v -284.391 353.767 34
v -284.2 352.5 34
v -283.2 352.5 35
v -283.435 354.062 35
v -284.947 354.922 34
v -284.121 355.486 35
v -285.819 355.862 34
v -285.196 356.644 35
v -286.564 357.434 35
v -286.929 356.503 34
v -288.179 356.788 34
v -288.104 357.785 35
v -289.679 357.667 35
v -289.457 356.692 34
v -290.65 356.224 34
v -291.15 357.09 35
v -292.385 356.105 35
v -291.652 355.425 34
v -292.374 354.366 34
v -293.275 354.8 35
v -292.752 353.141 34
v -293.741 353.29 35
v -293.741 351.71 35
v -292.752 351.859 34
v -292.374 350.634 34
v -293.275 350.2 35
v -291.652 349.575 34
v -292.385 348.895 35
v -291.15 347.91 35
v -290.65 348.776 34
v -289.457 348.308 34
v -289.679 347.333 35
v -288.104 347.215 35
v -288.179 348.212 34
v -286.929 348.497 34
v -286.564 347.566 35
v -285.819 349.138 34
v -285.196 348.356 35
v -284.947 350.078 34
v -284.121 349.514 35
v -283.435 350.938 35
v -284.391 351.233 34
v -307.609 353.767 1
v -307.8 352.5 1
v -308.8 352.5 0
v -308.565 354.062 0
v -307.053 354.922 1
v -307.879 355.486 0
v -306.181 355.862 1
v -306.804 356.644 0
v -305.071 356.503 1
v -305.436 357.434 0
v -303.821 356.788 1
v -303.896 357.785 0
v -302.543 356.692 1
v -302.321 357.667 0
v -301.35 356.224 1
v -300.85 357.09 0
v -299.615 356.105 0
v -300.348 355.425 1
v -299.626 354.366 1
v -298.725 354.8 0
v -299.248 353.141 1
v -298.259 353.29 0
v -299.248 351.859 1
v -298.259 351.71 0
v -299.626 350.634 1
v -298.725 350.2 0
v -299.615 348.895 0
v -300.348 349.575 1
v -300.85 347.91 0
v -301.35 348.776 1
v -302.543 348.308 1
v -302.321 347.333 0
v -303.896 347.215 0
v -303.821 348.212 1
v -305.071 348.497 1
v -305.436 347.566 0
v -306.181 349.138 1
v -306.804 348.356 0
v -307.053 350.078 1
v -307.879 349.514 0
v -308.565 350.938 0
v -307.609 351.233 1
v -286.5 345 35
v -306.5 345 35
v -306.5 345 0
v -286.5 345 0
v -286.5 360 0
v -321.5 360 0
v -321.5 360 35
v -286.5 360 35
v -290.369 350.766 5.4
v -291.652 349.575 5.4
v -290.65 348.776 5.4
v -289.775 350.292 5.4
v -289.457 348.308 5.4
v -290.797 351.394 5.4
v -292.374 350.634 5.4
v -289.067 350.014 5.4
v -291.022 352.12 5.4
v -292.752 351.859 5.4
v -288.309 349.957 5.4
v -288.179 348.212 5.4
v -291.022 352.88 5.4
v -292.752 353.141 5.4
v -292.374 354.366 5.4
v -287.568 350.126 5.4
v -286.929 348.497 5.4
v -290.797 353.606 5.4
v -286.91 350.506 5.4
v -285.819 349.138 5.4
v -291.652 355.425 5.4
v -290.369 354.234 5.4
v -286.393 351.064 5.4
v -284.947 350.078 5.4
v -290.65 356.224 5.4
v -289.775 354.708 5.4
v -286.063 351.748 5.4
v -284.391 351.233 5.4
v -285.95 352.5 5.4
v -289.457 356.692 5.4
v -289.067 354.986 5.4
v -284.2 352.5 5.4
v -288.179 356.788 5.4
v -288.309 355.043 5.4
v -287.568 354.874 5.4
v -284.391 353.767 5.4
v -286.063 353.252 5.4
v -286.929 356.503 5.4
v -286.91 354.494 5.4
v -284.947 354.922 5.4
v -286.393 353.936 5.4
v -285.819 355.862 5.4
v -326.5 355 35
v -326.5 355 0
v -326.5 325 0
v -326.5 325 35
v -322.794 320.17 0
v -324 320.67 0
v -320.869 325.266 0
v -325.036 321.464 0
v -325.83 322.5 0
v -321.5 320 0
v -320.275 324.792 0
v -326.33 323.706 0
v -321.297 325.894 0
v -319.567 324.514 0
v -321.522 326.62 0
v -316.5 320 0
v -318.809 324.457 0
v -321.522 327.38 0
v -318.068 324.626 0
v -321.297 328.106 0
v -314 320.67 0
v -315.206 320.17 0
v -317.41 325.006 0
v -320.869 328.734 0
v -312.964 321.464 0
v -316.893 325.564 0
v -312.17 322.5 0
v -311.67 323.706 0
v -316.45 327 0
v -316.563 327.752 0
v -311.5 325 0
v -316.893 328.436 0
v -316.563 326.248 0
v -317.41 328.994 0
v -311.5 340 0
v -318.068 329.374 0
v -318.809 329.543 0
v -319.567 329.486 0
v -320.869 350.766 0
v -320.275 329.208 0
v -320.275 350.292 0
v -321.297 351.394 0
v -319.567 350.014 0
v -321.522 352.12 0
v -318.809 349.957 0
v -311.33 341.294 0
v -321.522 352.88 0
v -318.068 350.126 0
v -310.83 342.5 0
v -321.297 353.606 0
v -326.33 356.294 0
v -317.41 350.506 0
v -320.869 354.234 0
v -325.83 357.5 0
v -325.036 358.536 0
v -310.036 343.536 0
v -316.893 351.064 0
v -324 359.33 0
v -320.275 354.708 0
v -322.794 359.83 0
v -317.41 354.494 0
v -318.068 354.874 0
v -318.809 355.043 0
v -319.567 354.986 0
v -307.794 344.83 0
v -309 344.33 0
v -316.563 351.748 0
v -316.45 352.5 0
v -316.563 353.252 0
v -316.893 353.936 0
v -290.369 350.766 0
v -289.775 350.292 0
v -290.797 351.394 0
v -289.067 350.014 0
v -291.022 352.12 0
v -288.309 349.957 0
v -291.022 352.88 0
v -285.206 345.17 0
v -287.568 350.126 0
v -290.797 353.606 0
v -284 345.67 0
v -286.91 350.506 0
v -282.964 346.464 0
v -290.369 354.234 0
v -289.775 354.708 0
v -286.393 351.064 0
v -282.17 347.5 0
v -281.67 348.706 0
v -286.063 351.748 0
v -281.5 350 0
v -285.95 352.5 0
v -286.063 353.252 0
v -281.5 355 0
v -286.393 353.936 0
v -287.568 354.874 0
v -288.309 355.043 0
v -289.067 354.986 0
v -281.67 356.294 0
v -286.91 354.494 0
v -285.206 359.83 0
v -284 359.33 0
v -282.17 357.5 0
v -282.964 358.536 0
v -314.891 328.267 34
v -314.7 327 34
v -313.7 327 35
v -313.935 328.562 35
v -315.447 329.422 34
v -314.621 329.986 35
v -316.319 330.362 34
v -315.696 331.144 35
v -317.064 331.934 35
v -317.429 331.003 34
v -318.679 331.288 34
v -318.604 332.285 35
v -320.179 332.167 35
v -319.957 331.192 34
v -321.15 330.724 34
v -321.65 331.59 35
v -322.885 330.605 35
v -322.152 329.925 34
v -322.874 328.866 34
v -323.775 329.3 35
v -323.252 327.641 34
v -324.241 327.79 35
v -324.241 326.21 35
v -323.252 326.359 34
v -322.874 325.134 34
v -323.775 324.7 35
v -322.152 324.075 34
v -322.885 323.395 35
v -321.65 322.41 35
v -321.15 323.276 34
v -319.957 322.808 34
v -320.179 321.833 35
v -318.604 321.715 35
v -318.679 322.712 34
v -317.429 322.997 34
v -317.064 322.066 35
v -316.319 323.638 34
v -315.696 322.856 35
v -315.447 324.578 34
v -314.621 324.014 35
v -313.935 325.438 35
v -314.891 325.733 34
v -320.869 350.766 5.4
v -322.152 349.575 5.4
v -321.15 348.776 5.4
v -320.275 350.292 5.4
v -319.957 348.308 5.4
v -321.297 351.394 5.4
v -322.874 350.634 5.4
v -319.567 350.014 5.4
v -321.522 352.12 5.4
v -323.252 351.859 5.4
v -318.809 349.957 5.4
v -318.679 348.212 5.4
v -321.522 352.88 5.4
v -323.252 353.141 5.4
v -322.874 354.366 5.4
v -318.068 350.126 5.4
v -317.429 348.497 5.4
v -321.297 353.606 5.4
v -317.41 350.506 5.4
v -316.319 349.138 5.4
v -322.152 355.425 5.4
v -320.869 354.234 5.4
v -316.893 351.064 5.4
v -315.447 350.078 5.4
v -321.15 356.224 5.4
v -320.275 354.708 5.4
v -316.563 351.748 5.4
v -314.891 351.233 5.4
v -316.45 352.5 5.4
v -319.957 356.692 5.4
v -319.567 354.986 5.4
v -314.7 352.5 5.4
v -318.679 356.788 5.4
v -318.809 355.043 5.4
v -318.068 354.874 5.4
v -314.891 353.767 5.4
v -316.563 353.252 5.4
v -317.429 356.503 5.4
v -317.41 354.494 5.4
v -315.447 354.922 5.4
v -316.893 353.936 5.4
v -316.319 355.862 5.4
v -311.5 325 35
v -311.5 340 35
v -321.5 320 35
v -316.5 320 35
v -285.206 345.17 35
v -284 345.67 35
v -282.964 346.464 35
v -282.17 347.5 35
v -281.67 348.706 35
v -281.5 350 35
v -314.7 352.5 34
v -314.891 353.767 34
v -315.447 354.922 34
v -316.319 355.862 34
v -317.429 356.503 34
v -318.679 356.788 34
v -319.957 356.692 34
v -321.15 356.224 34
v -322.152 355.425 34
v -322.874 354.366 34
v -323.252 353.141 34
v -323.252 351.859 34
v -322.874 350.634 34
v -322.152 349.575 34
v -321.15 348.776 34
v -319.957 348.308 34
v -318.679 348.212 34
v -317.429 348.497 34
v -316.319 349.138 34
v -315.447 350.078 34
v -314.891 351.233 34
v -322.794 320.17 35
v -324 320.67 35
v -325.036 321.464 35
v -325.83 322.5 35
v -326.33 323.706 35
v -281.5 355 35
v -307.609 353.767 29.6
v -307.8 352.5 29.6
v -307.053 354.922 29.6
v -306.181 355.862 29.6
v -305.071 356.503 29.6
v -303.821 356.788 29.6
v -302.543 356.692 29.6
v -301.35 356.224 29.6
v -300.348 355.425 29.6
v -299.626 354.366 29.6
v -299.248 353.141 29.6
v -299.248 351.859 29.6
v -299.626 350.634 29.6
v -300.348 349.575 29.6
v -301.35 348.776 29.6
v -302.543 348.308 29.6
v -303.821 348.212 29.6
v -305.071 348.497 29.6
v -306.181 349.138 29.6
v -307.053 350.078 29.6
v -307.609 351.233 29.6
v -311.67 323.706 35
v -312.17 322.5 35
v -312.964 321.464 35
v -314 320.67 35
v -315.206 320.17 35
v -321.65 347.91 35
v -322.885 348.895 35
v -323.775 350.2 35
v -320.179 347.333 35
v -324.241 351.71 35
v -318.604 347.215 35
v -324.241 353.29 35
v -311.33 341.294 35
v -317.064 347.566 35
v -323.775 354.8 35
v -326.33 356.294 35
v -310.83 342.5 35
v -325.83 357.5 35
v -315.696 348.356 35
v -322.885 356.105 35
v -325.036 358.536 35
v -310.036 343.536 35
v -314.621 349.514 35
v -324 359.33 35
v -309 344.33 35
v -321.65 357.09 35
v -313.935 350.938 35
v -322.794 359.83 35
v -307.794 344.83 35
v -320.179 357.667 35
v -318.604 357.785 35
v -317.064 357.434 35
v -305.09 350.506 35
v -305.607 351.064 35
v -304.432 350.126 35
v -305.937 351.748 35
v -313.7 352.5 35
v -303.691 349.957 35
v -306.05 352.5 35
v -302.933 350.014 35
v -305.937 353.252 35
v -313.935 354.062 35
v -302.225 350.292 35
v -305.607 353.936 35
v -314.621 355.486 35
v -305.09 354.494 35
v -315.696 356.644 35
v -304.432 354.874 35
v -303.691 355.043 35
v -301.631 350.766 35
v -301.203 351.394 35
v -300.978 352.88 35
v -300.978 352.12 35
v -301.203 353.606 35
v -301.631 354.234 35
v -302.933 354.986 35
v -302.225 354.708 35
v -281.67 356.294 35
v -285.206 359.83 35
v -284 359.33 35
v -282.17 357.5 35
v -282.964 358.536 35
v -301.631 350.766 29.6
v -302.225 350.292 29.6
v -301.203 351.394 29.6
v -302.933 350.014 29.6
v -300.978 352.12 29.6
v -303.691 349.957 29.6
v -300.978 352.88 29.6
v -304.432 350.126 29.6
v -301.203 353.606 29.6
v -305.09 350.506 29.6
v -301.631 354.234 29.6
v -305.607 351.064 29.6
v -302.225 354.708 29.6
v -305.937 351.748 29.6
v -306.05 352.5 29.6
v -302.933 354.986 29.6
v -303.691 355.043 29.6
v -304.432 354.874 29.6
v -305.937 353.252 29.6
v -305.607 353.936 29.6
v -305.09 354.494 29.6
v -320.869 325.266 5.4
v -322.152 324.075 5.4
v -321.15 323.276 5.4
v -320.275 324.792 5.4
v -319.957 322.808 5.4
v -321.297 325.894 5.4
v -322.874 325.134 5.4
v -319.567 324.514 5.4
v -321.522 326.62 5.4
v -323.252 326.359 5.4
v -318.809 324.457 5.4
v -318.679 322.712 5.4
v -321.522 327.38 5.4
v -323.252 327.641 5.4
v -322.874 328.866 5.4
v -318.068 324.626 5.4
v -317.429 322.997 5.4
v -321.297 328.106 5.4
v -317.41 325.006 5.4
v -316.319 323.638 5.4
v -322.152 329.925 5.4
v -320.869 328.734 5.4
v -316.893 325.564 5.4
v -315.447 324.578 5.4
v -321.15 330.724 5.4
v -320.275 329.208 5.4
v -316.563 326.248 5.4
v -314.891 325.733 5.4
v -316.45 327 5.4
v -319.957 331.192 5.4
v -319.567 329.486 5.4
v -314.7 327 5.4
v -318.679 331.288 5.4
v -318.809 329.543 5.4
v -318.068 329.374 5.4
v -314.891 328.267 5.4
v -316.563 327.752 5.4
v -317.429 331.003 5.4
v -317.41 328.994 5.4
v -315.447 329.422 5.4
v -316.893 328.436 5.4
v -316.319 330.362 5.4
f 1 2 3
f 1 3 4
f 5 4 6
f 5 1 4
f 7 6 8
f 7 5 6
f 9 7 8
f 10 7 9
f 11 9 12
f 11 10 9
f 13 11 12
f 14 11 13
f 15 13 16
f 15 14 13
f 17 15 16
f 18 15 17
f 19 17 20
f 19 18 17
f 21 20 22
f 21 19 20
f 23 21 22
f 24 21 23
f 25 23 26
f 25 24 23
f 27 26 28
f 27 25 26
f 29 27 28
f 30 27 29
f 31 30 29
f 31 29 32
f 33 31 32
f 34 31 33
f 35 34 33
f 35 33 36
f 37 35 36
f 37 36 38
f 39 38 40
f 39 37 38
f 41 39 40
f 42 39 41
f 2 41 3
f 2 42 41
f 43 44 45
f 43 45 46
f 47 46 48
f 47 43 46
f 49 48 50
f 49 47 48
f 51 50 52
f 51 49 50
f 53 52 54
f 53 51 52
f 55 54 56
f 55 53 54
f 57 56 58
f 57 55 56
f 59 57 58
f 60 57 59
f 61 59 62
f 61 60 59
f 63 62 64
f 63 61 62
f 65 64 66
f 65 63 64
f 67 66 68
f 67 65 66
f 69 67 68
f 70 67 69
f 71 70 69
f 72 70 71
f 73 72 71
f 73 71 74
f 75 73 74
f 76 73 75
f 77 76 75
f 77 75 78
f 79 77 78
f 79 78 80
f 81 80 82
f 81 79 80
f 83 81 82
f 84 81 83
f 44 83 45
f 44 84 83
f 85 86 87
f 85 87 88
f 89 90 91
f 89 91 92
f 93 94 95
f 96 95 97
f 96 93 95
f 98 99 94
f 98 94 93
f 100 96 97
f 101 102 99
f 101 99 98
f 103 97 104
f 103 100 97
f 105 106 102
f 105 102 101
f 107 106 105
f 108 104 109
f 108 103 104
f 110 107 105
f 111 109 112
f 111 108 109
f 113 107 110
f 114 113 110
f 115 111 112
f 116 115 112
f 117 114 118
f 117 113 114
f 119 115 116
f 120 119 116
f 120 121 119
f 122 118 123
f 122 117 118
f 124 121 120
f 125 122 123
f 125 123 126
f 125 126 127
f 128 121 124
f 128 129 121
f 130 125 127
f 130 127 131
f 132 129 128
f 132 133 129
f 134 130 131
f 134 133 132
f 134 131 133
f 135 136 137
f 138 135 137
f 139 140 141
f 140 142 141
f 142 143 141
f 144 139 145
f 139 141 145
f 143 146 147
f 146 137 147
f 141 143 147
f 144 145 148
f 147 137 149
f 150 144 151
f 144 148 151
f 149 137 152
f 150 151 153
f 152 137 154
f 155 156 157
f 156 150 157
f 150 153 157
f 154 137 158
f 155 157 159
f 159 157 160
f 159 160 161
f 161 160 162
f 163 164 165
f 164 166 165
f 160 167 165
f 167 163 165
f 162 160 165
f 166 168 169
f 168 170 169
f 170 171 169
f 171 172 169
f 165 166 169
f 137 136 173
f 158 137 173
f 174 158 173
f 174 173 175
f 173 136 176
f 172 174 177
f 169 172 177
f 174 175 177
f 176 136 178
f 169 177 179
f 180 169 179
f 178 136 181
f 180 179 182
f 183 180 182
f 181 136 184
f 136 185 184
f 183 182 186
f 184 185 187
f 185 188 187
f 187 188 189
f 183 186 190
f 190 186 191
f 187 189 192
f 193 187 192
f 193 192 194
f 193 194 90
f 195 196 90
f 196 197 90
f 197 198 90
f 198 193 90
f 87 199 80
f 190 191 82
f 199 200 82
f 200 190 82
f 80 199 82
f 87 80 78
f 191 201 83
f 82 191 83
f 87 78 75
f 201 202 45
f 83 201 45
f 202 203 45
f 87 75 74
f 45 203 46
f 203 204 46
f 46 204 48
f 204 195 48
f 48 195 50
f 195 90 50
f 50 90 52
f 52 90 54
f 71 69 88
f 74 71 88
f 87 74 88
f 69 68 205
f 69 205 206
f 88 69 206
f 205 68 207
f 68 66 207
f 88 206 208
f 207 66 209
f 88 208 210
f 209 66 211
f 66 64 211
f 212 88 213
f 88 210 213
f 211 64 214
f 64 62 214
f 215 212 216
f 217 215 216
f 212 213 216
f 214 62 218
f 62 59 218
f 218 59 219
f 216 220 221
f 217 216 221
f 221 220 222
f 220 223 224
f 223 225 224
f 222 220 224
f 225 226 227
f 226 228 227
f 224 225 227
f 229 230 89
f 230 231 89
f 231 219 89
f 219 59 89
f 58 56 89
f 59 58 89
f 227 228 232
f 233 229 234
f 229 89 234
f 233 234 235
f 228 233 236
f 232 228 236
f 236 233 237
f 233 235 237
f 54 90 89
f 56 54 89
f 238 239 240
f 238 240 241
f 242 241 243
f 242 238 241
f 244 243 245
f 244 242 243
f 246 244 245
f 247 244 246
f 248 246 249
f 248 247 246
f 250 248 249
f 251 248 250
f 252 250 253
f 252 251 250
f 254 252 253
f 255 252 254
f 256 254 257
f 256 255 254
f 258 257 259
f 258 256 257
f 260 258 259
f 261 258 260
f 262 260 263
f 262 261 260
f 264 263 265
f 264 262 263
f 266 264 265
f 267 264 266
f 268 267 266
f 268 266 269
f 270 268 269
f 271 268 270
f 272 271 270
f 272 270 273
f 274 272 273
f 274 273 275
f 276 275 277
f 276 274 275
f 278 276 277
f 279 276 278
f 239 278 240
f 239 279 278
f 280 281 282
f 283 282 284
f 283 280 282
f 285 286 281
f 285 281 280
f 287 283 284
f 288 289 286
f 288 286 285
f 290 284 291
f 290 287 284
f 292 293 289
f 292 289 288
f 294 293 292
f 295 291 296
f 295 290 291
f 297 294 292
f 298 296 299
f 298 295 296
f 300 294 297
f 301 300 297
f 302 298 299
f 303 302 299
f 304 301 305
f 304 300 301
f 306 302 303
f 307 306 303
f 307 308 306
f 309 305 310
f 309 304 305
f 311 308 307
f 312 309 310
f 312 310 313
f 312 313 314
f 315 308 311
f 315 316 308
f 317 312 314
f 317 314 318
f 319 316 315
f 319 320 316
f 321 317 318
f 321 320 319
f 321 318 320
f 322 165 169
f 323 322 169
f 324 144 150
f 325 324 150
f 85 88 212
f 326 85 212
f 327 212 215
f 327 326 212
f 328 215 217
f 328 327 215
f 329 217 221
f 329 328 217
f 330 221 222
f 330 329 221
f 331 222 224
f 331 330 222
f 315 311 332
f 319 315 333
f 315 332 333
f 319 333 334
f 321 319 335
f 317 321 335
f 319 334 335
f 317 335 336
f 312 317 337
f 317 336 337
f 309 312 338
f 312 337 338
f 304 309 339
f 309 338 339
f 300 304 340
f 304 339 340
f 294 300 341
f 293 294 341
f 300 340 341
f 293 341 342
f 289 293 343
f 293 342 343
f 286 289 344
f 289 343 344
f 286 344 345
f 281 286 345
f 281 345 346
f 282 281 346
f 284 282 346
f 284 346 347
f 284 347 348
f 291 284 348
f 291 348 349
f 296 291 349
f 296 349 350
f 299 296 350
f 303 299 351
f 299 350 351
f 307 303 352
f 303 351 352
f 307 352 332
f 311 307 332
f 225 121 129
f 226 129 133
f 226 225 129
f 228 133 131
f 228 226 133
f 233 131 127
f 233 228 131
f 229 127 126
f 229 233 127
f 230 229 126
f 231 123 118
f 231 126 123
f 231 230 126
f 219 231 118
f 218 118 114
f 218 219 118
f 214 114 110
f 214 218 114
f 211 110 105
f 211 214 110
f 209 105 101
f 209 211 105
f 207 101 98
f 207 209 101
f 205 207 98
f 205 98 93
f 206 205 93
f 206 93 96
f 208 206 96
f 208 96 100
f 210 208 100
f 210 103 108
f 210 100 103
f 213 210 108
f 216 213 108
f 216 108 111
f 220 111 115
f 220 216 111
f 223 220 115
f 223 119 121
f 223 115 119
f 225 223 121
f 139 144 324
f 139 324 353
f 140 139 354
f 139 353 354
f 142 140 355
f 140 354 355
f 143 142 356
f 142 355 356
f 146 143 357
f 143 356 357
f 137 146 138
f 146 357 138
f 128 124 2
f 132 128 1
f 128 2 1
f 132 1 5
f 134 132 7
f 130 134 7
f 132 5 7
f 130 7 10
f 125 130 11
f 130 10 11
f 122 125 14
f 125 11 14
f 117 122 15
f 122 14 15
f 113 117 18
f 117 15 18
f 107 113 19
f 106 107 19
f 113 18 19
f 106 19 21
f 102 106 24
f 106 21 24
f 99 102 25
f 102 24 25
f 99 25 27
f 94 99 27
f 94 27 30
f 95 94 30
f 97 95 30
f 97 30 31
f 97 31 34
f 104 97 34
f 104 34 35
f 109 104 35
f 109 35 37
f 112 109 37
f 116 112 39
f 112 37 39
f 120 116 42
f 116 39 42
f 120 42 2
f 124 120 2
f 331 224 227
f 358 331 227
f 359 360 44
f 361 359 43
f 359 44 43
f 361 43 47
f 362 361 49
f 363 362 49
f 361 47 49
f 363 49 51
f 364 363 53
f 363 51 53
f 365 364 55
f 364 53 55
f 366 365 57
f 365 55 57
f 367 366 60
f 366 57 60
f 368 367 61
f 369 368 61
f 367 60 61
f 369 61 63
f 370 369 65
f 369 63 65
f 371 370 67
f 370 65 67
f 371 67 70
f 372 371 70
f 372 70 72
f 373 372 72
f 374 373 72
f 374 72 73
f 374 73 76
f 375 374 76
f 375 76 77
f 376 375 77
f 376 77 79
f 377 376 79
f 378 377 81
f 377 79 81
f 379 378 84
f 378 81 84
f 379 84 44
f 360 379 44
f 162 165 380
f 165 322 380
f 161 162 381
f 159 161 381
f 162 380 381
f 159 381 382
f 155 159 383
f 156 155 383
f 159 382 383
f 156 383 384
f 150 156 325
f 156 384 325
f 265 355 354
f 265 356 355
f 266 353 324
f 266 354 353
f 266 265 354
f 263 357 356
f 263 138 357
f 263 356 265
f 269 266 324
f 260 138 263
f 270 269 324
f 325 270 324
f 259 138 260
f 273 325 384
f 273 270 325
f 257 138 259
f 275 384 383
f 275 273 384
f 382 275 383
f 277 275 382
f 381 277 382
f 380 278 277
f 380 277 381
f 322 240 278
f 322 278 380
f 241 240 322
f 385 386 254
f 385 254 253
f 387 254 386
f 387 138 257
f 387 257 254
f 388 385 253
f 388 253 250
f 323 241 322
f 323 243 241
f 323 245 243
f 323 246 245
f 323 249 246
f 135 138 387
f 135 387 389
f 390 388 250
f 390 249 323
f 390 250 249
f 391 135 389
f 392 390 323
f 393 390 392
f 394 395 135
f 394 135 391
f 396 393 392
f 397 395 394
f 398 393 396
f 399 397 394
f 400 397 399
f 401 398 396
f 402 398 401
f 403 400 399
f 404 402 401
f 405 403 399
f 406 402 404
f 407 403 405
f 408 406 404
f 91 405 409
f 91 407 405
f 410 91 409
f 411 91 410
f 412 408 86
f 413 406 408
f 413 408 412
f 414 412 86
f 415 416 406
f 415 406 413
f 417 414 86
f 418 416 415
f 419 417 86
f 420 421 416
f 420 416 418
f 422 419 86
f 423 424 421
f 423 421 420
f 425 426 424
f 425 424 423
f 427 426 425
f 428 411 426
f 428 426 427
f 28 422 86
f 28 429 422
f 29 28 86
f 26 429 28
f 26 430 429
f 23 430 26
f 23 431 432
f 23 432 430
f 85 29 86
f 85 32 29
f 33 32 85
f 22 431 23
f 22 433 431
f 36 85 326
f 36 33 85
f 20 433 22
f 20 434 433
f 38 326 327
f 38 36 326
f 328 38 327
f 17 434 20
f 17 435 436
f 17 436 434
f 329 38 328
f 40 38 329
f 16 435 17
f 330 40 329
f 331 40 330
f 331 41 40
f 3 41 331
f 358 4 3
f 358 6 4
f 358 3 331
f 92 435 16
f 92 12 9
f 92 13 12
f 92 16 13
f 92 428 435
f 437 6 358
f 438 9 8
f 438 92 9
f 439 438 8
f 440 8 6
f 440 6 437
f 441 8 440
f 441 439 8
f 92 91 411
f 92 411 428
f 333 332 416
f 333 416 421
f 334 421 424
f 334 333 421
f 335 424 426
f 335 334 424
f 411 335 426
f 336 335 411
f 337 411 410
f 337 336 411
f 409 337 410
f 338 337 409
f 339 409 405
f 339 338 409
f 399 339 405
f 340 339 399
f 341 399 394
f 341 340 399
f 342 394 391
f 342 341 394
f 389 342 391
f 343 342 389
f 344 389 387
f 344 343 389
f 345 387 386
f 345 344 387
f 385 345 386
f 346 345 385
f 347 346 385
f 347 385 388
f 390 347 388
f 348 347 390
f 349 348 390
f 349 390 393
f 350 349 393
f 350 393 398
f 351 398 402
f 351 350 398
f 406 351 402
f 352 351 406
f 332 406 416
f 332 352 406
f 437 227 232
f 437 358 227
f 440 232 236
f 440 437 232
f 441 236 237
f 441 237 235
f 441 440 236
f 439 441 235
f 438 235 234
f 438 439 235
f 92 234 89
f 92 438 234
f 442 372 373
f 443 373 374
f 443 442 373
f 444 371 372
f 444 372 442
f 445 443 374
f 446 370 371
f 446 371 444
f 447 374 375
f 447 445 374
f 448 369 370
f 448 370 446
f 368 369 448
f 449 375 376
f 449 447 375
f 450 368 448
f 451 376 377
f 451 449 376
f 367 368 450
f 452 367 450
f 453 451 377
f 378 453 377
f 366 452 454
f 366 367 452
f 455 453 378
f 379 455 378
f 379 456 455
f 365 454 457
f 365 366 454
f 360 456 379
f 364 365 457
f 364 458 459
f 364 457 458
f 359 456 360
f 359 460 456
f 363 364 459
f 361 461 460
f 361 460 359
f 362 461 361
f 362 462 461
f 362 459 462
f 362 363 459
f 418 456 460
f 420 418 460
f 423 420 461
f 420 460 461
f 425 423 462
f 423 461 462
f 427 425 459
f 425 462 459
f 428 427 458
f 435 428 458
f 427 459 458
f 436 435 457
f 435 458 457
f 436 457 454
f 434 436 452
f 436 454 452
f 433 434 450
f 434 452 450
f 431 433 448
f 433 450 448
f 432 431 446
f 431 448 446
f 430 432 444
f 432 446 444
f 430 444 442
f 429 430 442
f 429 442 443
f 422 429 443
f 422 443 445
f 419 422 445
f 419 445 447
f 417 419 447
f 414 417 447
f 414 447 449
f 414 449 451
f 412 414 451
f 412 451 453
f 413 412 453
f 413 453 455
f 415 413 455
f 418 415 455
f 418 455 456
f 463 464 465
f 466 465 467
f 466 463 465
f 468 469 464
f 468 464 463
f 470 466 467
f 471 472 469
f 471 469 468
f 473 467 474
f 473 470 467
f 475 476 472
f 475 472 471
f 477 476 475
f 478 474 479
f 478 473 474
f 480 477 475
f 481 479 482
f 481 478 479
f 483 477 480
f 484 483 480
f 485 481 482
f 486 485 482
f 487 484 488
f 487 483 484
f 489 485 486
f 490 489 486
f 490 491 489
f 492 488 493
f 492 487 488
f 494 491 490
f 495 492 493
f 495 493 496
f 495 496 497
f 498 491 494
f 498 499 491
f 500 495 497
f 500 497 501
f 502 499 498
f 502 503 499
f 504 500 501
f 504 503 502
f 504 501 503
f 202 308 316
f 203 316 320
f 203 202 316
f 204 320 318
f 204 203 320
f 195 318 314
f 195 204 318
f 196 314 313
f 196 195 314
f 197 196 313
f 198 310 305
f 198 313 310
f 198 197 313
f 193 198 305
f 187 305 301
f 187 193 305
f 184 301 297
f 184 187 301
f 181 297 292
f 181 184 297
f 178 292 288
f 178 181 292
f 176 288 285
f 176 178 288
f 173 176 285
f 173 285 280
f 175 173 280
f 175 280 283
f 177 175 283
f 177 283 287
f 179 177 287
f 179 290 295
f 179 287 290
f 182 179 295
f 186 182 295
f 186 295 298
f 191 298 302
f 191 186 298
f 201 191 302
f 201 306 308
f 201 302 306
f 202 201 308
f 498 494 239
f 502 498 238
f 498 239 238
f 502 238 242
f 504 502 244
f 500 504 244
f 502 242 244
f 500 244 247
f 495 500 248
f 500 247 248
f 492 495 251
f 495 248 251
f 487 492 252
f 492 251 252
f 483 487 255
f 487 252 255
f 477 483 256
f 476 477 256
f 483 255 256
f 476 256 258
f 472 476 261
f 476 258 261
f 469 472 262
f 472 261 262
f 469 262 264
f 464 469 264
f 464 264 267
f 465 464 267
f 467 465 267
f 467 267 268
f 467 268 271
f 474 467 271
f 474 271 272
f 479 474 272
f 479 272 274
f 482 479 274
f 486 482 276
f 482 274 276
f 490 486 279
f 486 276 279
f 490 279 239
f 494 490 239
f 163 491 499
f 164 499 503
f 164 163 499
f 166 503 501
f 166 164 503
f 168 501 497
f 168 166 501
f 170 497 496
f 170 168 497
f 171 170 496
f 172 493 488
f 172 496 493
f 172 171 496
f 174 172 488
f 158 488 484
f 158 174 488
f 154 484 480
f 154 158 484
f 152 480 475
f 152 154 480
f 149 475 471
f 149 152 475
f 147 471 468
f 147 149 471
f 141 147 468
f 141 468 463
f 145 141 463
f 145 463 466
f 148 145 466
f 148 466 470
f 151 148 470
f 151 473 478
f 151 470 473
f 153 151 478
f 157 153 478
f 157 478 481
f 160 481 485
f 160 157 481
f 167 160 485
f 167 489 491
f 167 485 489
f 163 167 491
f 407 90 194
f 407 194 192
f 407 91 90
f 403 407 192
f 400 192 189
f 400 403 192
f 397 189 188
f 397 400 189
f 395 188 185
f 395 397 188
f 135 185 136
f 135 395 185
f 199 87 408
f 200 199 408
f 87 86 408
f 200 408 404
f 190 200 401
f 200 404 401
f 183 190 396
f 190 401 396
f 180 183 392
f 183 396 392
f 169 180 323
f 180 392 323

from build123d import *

# Parameters (mm, degrees)
SKETCH2_R           = 2.55
SKETCH2_W           = 30
SKETCH2_H           = 15
BOSS_EXTRUDE1_DEPTH = 35
SKETCH3_R           = 4.3
CUT_EXTRUDE1_DEPTH  = 29.6
SKETCH4_R           = 4.3
CUT_EXTRUDE2_DEPTH  = 29.6
SKETCH5_R           = 2.55
CUT_EXTRUDE3_DEPTH  = 29.6
FILLET1_R           = 5
CHAMFER1_SIZE       = 1


with BuildPart() as part:
    # Sketch2 → Boss-Extrude1 (new body)
    # profile 1 of 2: a face of its own
    with BuildSketch(Plane.XY):
        Polygon((-326.5, 320), (-311.5, 320), (-311.5, 345), (-311.5, 360), (-326.5, 360), align=None)
        with Locations((-319, 327)):
            Circle(SKETCH2_R, mode=Mode.SUBTRACT)
        with Locations((-319, 352.5)):
            Circle(SKETCH2_R, mode=Mode.SUBTRACT)
    # profile 2 of 2: a face of its own
    with BuildSketch(Plane.XY):
        with Locations((-296.5, 352.5)):
            Rectangle(SKETCH2_W, SKETCH2_H)
        with Locations((-288.5, 352.5)):
            Circle(SKETCH2_R, mode=Mode.SUBTRACT)
    extrude(amount=BOSS_EXTRUDE1_DEPTH)

    # Sketch3 → Cut-Extrude1 (cut)
    with BuildSketch(Plane.XY.offset(35)):
        with Locations((-319, 352.5)):
            Circle(SKETCH3_R)
        with Locations((-319, 327)):
            Circle(SKETCH3_R)
        with Locations((-288.5, 352.5)):
            Circle(SKETCH3_R)
    extrude(amount=-CUT_EXTRUDE1_DEPTH, mode=Mode.SUBTRACT)

    # Sketch4 → Cut-Extrude2 (cut)
    with BuildSketch(Plane(origin=(0, 0, 0), x_dir=(-1, 0, 0), z_dir=(0, 0, -1))):
        with Locations((303.5, 352.5)):
            Circle(SKETCH4_R)
    extrude(amount=-CUT_EXTRUDE2_DEPTH, mode=Mode.SUBTRACT)

    # Sketch5 → Cut-Extrude3 (cut)
    with BuildSketch(Plane(origin=(0, 0, 29.6), x_dir=(-1, 0, 0), z_dir=(0, 0, -1))):
        with Locations((303.5, 352.5)):
            Circle(SKETCH5_R)
    extrude(amount=-CUT_EXTRUDE3_DEPTH, mode=Mode.SUBTRACT)

    # Fillet1
    fillet1_edges = [part.edges().sort_by_distance(p)[0] for p in [
        (-311.5, 345, 17.5),
        (-281.5, 345, 17.5),
        (-281.5, 360, 17.5),
        (-311.5, 320, 17.5),
        (-326.5, 320, 17.5),
        (-326.5, 360, 17.5),
    ]]
    fillet(fillet1_edges, radius=FILLET1_R)

    # Chamfer1
    chamfer1_edges = [part.edges().sort_by_distance(p)[0] for p in [
        (-292.8, 352.5, 35),
        (-323.3, 327, 35),
        (-323.3, 352.5, 35),
        (-299.2, 352.5, 0),
    ]]
    chamfer(chamfer1_edges, length=CHAMFER1_SIZE)


solid = part.part
